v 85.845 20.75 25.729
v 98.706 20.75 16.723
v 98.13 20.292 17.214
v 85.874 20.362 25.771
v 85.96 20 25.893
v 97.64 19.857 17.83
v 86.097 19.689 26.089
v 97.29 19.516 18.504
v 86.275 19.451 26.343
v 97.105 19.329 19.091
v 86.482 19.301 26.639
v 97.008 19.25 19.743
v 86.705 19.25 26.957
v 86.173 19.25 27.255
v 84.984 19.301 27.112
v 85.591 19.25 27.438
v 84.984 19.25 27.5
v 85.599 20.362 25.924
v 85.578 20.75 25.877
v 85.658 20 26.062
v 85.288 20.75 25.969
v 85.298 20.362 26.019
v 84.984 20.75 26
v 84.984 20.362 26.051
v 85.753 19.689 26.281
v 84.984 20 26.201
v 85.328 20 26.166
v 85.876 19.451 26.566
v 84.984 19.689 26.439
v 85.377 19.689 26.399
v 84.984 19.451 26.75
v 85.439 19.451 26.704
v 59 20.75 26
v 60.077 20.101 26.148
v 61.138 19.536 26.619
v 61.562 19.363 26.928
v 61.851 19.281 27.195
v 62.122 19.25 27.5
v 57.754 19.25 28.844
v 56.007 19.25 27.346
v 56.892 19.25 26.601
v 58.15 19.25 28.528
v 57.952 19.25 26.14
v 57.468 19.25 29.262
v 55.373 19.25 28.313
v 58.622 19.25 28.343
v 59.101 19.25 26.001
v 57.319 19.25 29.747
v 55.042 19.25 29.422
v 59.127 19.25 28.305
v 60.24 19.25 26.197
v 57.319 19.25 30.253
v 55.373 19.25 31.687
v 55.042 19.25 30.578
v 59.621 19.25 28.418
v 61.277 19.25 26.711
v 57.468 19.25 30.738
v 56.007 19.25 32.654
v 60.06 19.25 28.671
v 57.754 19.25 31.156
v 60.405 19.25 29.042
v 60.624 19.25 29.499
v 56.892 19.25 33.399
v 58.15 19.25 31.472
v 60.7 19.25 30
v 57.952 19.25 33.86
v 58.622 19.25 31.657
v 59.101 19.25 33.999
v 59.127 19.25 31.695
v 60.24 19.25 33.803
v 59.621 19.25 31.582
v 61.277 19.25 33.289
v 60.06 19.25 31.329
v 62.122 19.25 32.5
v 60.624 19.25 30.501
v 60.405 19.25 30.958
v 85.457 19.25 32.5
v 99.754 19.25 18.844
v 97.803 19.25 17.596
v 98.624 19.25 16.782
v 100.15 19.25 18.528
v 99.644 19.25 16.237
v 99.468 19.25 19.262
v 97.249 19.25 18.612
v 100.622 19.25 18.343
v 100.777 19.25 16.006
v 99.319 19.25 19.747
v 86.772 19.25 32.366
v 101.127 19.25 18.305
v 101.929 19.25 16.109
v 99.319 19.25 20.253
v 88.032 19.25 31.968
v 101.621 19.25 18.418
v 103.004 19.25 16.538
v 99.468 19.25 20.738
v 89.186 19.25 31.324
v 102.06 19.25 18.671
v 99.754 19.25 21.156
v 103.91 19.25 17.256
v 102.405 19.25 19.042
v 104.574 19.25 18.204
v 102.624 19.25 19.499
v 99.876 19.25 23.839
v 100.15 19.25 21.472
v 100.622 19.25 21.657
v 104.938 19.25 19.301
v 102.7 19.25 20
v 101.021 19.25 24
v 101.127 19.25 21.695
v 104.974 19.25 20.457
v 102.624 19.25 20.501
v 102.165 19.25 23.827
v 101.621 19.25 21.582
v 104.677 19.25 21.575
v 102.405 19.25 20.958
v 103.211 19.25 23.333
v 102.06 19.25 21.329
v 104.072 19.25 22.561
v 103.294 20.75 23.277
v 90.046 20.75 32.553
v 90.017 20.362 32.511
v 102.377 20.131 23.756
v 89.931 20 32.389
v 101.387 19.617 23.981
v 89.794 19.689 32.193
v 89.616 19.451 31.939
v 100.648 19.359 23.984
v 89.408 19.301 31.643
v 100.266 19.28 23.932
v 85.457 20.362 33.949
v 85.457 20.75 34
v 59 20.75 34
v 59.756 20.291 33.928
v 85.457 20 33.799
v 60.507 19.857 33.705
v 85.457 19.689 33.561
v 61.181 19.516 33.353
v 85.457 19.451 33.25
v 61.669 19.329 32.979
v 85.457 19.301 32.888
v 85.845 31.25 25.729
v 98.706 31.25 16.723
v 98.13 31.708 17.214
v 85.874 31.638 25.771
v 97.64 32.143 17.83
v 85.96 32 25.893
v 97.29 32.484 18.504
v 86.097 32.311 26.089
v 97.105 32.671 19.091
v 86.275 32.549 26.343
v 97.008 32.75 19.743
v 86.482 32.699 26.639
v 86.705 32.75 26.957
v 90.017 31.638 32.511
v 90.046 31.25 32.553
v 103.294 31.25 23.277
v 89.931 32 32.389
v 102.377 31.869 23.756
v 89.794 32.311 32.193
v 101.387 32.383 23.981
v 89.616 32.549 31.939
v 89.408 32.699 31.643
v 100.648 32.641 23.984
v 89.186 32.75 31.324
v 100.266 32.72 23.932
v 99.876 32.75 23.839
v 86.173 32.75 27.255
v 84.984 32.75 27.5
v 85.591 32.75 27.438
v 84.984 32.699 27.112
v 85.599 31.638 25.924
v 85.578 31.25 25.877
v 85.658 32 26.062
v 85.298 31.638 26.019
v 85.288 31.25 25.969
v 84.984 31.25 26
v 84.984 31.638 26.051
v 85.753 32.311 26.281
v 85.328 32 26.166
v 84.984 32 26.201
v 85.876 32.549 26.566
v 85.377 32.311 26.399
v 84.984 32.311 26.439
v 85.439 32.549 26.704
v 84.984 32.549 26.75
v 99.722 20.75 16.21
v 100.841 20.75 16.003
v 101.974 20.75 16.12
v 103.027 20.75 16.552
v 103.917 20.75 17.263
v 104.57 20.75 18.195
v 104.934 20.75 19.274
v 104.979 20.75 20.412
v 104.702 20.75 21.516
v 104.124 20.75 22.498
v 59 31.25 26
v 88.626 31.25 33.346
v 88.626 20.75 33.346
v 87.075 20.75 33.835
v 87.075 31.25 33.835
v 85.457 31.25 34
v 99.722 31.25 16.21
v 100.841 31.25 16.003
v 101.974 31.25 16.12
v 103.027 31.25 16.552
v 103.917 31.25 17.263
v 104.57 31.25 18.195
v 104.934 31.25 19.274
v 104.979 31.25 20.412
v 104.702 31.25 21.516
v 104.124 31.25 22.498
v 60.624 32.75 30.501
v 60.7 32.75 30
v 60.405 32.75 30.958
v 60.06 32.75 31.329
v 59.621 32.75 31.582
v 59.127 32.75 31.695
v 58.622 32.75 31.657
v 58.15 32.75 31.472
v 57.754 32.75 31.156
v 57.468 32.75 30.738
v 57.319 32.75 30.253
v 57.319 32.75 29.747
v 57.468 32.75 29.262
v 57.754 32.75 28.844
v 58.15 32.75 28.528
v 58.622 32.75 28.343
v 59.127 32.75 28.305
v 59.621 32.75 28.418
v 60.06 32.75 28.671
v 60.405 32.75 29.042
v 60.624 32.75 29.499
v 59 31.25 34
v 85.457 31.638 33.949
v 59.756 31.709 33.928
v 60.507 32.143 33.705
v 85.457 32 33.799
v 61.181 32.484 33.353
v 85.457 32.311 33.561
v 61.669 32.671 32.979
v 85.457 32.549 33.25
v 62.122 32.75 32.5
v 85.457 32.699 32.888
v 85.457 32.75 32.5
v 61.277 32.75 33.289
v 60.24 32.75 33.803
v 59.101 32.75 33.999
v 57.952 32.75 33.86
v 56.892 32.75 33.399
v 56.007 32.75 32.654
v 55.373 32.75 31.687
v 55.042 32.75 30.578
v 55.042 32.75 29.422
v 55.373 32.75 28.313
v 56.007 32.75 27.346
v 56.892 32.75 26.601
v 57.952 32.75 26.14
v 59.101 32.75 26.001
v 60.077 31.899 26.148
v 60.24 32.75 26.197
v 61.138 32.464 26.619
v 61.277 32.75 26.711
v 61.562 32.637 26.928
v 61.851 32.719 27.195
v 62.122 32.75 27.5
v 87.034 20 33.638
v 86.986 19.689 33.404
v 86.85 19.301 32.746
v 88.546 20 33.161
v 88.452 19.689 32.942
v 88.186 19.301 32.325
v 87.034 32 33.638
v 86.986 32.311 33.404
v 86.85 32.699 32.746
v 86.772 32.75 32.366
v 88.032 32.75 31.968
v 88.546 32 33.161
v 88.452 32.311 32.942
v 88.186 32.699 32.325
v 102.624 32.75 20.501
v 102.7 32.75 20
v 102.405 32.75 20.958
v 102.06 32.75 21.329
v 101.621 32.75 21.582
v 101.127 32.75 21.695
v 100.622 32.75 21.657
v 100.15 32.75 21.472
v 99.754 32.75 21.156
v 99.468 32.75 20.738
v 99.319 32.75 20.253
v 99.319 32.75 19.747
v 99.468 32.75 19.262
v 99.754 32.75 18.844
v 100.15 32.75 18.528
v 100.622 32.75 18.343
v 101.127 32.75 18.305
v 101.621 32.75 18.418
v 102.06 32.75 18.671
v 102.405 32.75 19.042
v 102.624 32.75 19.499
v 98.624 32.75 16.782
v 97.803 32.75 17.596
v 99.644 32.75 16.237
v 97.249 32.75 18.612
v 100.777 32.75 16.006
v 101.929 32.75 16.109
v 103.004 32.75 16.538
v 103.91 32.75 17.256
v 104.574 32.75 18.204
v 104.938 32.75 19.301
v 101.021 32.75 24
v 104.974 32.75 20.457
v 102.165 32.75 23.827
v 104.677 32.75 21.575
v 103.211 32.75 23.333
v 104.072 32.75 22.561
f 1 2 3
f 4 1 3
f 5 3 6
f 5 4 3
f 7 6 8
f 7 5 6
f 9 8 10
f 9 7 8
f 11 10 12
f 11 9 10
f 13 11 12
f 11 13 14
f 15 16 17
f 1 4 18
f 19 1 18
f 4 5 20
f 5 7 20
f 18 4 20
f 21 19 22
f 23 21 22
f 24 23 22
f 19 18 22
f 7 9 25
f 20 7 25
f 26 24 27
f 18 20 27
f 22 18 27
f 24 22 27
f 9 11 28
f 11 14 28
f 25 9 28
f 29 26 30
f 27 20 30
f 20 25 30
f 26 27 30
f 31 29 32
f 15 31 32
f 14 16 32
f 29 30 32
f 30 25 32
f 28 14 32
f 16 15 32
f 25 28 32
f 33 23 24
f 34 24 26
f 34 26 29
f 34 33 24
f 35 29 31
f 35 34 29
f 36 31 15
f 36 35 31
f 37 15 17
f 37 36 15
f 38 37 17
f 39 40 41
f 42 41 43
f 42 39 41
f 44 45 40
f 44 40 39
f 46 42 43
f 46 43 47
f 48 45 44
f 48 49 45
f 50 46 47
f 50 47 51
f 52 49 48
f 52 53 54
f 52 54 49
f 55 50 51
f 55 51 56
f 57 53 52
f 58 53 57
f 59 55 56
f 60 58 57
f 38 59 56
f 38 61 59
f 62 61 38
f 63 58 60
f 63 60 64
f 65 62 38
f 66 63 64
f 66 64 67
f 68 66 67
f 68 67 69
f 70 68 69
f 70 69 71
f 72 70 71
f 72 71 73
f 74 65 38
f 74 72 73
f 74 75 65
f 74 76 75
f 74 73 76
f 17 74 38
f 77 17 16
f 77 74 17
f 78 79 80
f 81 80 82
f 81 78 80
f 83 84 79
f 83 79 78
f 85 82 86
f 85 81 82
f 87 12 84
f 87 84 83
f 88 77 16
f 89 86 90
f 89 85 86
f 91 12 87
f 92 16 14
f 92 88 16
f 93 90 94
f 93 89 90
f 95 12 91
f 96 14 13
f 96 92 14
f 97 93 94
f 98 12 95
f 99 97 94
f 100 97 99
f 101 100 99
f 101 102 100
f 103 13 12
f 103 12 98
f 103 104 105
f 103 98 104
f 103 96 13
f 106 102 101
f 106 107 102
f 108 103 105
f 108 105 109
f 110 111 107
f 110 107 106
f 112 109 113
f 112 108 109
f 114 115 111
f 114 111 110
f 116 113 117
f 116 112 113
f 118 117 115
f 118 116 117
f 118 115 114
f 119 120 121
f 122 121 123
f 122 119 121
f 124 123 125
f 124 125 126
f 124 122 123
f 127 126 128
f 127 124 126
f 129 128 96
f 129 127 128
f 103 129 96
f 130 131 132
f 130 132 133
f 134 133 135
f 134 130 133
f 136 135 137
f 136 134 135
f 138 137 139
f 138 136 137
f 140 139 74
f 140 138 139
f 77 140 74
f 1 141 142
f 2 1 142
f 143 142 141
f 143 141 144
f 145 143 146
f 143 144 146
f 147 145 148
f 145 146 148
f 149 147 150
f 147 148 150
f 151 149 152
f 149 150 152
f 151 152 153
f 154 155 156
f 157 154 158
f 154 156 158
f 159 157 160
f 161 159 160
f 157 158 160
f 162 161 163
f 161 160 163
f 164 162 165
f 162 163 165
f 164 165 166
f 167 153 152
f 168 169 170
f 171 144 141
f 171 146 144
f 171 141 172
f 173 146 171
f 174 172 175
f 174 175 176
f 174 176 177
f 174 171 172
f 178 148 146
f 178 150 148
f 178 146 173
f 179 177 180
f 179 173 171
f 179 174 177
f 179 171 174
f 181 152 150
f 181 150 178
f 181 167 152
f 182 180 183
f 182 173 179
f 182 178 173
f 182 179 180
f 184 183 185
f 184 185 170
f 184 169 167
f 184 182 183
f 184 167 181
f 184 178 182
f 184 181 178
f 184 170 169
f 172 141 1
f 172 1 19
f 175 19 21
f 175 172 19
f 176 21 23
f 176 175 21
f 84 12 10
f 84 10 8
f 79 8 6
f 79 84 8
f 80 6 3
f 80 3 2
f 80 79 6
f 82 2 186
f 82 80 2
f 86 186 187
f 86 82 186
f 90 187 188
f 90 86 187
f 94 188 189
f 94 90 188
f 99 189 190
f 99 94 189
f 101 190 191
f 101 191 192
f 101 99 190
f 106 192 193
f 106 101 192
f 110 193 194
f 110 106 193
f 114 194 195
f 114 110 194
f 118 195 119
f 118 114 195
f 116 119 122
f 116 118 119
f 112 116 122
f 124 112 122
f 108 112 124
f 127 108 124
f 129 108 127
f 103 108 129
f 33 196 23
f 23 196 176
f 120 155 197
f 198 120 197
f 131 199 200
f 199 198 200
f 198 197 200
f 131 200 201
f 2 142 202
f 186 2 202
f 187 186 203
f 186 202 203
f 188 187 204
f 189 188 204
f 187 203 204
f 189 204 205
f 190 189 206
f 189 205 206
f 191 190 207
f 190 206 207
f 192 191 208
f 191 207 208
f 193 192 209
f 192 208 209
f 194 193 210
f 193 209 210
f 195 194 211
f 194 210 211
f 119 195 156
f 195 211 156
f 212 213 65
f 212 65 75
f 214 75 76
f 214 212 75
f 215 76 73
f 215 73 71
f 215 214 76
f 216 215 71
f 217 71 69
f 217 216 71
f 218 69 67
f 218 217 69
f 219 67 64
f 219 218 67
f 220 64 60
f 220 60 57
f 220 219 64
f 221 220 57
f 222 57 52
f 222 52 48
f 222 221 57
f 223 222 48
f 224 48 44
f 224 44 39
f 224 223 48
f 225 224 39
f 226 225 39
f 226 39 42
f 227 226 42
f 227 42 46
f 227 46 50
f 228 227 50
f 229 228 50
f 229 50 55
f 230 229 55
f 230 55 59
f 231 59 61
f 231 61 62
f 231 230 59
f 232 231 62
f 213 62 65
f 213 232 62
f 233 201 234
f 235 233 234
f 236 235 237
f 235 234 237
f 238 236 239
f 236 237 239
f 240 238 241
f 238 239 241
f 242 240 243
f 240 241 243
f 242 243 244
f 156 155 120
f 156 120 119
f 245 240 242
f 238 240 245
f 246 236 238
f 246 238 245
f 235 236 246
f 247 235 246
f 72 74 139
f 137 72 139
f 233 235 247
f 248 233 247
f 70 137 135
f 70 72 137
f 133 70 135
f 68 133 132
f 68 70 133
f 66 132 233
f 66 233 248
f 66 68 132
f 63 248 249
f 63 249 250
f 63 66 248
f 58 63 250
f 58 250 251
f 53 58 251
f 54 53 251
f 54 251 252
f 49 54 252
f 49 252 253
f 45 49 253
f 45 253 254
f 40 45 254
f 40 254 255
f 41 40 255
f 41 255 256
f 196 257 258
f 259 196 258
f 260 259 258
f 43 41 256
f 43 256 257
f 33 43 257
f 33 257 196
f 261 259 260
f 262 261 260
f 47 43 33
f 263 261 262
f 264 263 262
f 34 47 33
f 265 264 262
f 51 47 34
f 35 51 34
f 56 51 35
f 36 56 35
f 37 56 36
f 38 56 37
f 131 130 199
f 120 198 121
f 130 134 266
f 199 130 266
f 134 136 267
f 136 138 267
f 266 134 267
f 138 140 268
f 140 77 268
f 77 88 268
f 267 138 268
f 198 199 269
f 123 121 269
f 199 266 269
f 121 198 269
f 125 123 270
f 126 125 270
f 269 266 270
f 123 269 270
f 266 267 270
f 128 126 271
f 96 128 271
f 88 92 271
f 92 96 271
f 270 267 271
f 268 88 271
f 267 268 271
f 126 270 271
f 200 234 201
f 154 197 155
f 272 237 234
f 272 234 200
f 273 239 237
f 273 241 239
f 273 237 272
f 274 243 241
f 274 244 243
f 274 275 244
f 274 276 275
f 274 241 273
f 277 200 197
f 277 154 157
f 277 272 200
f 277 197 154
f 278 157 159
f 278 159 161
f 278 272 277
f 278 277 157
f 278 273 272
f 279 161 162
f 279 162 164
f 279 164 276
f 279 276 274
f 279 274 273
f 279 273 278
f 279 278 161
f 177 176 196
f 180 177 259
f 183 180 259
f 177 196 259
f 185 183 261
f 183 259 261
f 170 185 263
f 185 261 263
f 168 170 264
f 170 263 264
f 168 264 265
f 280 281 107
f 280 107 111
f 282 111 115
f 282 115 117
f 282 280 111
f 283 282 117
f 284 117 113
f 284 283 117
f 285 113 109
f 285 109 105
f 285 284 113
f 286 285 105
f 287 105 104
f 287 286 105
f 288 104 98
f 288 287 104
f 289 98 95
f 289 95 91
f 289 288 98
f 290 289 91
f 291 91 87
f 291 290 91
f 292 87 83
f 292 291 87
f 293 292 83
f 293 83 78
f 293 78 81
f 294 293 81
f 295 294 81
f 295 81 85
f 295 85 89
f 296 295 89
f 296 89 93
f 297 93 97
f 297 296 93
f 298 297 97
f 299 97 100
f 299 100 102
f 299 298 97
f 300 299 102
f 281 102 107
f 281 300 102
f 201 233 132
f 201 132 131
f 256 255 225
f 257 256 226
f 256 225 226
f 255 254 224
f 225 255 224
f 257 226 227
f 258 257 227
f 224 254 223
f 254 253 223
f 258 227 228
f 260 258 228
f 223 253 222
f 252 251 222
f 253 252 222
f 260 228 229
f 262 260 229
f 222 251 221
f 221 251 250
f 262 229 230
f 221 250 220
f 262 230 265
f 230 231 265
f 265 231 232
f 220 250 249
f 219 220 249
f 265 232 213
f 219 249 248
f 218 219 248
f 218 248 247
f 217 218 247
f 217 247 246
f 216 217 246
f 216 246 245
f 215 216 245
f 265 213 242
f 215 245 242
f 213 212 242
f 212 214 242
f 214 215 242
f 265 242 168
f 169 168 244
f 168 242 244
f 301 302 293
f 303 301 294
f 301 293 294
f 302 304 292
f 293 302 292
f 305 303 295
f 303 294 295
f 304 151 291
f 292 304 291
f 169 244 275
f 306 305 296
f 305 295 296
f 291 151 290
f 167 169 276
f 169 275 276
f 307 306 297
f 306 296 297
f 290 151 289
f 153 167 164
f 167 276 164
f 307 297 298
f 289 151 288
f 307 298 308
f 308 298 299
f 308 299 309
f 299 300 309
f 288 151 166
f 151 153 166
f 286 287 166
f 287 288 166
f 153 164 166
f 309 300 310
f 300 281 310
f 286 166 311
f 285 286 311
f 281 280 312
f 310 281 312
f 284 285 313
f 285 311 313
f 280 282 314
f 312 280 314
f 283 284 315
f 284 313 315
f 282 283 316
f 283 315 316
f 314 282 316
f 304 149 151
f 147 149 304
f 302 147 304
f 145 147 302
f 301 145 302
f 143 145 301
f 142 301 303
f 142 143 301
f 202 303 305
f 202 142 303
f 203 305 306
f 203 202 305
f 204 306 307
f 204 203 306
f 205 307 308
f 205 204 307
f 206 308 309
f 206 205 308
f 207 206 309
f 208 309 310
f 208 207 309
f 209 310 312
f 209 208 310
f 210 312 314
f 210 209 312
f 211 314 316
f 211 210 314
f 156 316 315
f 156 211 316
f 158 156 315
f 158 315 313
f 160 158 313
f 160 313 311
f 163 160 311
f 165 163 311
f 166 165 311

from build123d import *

# Parameters (mm, degrees)
SKETCH007_R              = 1.7
PAD019_DEPTH             = 13.5
FILLET006_R              = 1.5
SKETCH035_R              = 4
SKETCH035_R_2            = 1.7
PAD020_DEPTH             = 13.5
CLONE161_PLACEMENT_ANGLE = 180


with BuildPart() as part:
    # Sketch007 → Pad019 (new body)
    with BuildSketch(Plane(origin=(0, 19.25, 0), x_dir=(-1, 0, 0), z_dir=(0, 1, 0))):
        with BuildLine():
            ThreePointArc((12, 26), (8, 22), (12, 18))
            Line((12, 18), (37.984377, 18))
            ThreePointArc((38.844741, 17.728728), (38.435435, 17.930575), (37.984377, 18))
            Line((38.844741, 17.728728), (51.705713, 8.723378))
            ThreePointArc((51.705713, 8.723378), (57.276616, 9.705705), (56.294304, 15.27661))
            Line((43.045936, 24.553216), (56.294304, 15.27661))
            ThreePointArc((43.045936, 24.553216), (40.862971, 25.629736), (38.457325, 26))
            Line((12, 26), (38.457325, 26))
        make_face()
        with Locations((12, 22)):
            Circle(SKETCH007_R, mode=Mode.SUBTRACT)
        with Locations((54, 12)):
            Circle(SKETCH007_R, mode=Mode.SUBTRACT)
    extrude(amount=PAD019_DEPTH)

    # Fillet006
    fillet006_edges = [part.edges().sort_by_distance(p)[0] for p in [
        (-49.67012, 32.75, 19.914913),
        (-49.67012, 19.25, 19.914913),
    ]]
    fillet(fillet006_edges, radius=FILLET006_R)

    # Sketch035 (on Face12 of Fillet006) → Pad020 (join)
    with BuildSketch(Plane(origin=(0, 32.75, 0), x_dir=(-1, 0, 0), z_dir=(0, 1, 0))):
        with Locations((54, 12)):
            Circle(SKETCH035_R)
        with Locations((54, 12)):
            Circle(SKETCH035_R_2, mode=Mode.SUBTRACT)
        with Locations((12, 22)):
            Circle(SKETCH035_R)
        with Locations((12, 22)):
            Circle(SKETCH035_R_2, mode=Mode.SUBTRACT)
    extrude(amount=-PAD020_DEPTH)


with BuildPart() as part_1:
    # Body002 placement: moved
    add(part.part.moved(Location((0, -5, 0))))


with BuildPart() as part_2:
    # Clone161 placement: moved
    add(part_1.part.moved(Location((47, 47, 8))).rotate(Axis((47, 47, 8), (0, 0, 1)), CLONE161_PLACEMENT_ANGLE))


solid = part_2.part
